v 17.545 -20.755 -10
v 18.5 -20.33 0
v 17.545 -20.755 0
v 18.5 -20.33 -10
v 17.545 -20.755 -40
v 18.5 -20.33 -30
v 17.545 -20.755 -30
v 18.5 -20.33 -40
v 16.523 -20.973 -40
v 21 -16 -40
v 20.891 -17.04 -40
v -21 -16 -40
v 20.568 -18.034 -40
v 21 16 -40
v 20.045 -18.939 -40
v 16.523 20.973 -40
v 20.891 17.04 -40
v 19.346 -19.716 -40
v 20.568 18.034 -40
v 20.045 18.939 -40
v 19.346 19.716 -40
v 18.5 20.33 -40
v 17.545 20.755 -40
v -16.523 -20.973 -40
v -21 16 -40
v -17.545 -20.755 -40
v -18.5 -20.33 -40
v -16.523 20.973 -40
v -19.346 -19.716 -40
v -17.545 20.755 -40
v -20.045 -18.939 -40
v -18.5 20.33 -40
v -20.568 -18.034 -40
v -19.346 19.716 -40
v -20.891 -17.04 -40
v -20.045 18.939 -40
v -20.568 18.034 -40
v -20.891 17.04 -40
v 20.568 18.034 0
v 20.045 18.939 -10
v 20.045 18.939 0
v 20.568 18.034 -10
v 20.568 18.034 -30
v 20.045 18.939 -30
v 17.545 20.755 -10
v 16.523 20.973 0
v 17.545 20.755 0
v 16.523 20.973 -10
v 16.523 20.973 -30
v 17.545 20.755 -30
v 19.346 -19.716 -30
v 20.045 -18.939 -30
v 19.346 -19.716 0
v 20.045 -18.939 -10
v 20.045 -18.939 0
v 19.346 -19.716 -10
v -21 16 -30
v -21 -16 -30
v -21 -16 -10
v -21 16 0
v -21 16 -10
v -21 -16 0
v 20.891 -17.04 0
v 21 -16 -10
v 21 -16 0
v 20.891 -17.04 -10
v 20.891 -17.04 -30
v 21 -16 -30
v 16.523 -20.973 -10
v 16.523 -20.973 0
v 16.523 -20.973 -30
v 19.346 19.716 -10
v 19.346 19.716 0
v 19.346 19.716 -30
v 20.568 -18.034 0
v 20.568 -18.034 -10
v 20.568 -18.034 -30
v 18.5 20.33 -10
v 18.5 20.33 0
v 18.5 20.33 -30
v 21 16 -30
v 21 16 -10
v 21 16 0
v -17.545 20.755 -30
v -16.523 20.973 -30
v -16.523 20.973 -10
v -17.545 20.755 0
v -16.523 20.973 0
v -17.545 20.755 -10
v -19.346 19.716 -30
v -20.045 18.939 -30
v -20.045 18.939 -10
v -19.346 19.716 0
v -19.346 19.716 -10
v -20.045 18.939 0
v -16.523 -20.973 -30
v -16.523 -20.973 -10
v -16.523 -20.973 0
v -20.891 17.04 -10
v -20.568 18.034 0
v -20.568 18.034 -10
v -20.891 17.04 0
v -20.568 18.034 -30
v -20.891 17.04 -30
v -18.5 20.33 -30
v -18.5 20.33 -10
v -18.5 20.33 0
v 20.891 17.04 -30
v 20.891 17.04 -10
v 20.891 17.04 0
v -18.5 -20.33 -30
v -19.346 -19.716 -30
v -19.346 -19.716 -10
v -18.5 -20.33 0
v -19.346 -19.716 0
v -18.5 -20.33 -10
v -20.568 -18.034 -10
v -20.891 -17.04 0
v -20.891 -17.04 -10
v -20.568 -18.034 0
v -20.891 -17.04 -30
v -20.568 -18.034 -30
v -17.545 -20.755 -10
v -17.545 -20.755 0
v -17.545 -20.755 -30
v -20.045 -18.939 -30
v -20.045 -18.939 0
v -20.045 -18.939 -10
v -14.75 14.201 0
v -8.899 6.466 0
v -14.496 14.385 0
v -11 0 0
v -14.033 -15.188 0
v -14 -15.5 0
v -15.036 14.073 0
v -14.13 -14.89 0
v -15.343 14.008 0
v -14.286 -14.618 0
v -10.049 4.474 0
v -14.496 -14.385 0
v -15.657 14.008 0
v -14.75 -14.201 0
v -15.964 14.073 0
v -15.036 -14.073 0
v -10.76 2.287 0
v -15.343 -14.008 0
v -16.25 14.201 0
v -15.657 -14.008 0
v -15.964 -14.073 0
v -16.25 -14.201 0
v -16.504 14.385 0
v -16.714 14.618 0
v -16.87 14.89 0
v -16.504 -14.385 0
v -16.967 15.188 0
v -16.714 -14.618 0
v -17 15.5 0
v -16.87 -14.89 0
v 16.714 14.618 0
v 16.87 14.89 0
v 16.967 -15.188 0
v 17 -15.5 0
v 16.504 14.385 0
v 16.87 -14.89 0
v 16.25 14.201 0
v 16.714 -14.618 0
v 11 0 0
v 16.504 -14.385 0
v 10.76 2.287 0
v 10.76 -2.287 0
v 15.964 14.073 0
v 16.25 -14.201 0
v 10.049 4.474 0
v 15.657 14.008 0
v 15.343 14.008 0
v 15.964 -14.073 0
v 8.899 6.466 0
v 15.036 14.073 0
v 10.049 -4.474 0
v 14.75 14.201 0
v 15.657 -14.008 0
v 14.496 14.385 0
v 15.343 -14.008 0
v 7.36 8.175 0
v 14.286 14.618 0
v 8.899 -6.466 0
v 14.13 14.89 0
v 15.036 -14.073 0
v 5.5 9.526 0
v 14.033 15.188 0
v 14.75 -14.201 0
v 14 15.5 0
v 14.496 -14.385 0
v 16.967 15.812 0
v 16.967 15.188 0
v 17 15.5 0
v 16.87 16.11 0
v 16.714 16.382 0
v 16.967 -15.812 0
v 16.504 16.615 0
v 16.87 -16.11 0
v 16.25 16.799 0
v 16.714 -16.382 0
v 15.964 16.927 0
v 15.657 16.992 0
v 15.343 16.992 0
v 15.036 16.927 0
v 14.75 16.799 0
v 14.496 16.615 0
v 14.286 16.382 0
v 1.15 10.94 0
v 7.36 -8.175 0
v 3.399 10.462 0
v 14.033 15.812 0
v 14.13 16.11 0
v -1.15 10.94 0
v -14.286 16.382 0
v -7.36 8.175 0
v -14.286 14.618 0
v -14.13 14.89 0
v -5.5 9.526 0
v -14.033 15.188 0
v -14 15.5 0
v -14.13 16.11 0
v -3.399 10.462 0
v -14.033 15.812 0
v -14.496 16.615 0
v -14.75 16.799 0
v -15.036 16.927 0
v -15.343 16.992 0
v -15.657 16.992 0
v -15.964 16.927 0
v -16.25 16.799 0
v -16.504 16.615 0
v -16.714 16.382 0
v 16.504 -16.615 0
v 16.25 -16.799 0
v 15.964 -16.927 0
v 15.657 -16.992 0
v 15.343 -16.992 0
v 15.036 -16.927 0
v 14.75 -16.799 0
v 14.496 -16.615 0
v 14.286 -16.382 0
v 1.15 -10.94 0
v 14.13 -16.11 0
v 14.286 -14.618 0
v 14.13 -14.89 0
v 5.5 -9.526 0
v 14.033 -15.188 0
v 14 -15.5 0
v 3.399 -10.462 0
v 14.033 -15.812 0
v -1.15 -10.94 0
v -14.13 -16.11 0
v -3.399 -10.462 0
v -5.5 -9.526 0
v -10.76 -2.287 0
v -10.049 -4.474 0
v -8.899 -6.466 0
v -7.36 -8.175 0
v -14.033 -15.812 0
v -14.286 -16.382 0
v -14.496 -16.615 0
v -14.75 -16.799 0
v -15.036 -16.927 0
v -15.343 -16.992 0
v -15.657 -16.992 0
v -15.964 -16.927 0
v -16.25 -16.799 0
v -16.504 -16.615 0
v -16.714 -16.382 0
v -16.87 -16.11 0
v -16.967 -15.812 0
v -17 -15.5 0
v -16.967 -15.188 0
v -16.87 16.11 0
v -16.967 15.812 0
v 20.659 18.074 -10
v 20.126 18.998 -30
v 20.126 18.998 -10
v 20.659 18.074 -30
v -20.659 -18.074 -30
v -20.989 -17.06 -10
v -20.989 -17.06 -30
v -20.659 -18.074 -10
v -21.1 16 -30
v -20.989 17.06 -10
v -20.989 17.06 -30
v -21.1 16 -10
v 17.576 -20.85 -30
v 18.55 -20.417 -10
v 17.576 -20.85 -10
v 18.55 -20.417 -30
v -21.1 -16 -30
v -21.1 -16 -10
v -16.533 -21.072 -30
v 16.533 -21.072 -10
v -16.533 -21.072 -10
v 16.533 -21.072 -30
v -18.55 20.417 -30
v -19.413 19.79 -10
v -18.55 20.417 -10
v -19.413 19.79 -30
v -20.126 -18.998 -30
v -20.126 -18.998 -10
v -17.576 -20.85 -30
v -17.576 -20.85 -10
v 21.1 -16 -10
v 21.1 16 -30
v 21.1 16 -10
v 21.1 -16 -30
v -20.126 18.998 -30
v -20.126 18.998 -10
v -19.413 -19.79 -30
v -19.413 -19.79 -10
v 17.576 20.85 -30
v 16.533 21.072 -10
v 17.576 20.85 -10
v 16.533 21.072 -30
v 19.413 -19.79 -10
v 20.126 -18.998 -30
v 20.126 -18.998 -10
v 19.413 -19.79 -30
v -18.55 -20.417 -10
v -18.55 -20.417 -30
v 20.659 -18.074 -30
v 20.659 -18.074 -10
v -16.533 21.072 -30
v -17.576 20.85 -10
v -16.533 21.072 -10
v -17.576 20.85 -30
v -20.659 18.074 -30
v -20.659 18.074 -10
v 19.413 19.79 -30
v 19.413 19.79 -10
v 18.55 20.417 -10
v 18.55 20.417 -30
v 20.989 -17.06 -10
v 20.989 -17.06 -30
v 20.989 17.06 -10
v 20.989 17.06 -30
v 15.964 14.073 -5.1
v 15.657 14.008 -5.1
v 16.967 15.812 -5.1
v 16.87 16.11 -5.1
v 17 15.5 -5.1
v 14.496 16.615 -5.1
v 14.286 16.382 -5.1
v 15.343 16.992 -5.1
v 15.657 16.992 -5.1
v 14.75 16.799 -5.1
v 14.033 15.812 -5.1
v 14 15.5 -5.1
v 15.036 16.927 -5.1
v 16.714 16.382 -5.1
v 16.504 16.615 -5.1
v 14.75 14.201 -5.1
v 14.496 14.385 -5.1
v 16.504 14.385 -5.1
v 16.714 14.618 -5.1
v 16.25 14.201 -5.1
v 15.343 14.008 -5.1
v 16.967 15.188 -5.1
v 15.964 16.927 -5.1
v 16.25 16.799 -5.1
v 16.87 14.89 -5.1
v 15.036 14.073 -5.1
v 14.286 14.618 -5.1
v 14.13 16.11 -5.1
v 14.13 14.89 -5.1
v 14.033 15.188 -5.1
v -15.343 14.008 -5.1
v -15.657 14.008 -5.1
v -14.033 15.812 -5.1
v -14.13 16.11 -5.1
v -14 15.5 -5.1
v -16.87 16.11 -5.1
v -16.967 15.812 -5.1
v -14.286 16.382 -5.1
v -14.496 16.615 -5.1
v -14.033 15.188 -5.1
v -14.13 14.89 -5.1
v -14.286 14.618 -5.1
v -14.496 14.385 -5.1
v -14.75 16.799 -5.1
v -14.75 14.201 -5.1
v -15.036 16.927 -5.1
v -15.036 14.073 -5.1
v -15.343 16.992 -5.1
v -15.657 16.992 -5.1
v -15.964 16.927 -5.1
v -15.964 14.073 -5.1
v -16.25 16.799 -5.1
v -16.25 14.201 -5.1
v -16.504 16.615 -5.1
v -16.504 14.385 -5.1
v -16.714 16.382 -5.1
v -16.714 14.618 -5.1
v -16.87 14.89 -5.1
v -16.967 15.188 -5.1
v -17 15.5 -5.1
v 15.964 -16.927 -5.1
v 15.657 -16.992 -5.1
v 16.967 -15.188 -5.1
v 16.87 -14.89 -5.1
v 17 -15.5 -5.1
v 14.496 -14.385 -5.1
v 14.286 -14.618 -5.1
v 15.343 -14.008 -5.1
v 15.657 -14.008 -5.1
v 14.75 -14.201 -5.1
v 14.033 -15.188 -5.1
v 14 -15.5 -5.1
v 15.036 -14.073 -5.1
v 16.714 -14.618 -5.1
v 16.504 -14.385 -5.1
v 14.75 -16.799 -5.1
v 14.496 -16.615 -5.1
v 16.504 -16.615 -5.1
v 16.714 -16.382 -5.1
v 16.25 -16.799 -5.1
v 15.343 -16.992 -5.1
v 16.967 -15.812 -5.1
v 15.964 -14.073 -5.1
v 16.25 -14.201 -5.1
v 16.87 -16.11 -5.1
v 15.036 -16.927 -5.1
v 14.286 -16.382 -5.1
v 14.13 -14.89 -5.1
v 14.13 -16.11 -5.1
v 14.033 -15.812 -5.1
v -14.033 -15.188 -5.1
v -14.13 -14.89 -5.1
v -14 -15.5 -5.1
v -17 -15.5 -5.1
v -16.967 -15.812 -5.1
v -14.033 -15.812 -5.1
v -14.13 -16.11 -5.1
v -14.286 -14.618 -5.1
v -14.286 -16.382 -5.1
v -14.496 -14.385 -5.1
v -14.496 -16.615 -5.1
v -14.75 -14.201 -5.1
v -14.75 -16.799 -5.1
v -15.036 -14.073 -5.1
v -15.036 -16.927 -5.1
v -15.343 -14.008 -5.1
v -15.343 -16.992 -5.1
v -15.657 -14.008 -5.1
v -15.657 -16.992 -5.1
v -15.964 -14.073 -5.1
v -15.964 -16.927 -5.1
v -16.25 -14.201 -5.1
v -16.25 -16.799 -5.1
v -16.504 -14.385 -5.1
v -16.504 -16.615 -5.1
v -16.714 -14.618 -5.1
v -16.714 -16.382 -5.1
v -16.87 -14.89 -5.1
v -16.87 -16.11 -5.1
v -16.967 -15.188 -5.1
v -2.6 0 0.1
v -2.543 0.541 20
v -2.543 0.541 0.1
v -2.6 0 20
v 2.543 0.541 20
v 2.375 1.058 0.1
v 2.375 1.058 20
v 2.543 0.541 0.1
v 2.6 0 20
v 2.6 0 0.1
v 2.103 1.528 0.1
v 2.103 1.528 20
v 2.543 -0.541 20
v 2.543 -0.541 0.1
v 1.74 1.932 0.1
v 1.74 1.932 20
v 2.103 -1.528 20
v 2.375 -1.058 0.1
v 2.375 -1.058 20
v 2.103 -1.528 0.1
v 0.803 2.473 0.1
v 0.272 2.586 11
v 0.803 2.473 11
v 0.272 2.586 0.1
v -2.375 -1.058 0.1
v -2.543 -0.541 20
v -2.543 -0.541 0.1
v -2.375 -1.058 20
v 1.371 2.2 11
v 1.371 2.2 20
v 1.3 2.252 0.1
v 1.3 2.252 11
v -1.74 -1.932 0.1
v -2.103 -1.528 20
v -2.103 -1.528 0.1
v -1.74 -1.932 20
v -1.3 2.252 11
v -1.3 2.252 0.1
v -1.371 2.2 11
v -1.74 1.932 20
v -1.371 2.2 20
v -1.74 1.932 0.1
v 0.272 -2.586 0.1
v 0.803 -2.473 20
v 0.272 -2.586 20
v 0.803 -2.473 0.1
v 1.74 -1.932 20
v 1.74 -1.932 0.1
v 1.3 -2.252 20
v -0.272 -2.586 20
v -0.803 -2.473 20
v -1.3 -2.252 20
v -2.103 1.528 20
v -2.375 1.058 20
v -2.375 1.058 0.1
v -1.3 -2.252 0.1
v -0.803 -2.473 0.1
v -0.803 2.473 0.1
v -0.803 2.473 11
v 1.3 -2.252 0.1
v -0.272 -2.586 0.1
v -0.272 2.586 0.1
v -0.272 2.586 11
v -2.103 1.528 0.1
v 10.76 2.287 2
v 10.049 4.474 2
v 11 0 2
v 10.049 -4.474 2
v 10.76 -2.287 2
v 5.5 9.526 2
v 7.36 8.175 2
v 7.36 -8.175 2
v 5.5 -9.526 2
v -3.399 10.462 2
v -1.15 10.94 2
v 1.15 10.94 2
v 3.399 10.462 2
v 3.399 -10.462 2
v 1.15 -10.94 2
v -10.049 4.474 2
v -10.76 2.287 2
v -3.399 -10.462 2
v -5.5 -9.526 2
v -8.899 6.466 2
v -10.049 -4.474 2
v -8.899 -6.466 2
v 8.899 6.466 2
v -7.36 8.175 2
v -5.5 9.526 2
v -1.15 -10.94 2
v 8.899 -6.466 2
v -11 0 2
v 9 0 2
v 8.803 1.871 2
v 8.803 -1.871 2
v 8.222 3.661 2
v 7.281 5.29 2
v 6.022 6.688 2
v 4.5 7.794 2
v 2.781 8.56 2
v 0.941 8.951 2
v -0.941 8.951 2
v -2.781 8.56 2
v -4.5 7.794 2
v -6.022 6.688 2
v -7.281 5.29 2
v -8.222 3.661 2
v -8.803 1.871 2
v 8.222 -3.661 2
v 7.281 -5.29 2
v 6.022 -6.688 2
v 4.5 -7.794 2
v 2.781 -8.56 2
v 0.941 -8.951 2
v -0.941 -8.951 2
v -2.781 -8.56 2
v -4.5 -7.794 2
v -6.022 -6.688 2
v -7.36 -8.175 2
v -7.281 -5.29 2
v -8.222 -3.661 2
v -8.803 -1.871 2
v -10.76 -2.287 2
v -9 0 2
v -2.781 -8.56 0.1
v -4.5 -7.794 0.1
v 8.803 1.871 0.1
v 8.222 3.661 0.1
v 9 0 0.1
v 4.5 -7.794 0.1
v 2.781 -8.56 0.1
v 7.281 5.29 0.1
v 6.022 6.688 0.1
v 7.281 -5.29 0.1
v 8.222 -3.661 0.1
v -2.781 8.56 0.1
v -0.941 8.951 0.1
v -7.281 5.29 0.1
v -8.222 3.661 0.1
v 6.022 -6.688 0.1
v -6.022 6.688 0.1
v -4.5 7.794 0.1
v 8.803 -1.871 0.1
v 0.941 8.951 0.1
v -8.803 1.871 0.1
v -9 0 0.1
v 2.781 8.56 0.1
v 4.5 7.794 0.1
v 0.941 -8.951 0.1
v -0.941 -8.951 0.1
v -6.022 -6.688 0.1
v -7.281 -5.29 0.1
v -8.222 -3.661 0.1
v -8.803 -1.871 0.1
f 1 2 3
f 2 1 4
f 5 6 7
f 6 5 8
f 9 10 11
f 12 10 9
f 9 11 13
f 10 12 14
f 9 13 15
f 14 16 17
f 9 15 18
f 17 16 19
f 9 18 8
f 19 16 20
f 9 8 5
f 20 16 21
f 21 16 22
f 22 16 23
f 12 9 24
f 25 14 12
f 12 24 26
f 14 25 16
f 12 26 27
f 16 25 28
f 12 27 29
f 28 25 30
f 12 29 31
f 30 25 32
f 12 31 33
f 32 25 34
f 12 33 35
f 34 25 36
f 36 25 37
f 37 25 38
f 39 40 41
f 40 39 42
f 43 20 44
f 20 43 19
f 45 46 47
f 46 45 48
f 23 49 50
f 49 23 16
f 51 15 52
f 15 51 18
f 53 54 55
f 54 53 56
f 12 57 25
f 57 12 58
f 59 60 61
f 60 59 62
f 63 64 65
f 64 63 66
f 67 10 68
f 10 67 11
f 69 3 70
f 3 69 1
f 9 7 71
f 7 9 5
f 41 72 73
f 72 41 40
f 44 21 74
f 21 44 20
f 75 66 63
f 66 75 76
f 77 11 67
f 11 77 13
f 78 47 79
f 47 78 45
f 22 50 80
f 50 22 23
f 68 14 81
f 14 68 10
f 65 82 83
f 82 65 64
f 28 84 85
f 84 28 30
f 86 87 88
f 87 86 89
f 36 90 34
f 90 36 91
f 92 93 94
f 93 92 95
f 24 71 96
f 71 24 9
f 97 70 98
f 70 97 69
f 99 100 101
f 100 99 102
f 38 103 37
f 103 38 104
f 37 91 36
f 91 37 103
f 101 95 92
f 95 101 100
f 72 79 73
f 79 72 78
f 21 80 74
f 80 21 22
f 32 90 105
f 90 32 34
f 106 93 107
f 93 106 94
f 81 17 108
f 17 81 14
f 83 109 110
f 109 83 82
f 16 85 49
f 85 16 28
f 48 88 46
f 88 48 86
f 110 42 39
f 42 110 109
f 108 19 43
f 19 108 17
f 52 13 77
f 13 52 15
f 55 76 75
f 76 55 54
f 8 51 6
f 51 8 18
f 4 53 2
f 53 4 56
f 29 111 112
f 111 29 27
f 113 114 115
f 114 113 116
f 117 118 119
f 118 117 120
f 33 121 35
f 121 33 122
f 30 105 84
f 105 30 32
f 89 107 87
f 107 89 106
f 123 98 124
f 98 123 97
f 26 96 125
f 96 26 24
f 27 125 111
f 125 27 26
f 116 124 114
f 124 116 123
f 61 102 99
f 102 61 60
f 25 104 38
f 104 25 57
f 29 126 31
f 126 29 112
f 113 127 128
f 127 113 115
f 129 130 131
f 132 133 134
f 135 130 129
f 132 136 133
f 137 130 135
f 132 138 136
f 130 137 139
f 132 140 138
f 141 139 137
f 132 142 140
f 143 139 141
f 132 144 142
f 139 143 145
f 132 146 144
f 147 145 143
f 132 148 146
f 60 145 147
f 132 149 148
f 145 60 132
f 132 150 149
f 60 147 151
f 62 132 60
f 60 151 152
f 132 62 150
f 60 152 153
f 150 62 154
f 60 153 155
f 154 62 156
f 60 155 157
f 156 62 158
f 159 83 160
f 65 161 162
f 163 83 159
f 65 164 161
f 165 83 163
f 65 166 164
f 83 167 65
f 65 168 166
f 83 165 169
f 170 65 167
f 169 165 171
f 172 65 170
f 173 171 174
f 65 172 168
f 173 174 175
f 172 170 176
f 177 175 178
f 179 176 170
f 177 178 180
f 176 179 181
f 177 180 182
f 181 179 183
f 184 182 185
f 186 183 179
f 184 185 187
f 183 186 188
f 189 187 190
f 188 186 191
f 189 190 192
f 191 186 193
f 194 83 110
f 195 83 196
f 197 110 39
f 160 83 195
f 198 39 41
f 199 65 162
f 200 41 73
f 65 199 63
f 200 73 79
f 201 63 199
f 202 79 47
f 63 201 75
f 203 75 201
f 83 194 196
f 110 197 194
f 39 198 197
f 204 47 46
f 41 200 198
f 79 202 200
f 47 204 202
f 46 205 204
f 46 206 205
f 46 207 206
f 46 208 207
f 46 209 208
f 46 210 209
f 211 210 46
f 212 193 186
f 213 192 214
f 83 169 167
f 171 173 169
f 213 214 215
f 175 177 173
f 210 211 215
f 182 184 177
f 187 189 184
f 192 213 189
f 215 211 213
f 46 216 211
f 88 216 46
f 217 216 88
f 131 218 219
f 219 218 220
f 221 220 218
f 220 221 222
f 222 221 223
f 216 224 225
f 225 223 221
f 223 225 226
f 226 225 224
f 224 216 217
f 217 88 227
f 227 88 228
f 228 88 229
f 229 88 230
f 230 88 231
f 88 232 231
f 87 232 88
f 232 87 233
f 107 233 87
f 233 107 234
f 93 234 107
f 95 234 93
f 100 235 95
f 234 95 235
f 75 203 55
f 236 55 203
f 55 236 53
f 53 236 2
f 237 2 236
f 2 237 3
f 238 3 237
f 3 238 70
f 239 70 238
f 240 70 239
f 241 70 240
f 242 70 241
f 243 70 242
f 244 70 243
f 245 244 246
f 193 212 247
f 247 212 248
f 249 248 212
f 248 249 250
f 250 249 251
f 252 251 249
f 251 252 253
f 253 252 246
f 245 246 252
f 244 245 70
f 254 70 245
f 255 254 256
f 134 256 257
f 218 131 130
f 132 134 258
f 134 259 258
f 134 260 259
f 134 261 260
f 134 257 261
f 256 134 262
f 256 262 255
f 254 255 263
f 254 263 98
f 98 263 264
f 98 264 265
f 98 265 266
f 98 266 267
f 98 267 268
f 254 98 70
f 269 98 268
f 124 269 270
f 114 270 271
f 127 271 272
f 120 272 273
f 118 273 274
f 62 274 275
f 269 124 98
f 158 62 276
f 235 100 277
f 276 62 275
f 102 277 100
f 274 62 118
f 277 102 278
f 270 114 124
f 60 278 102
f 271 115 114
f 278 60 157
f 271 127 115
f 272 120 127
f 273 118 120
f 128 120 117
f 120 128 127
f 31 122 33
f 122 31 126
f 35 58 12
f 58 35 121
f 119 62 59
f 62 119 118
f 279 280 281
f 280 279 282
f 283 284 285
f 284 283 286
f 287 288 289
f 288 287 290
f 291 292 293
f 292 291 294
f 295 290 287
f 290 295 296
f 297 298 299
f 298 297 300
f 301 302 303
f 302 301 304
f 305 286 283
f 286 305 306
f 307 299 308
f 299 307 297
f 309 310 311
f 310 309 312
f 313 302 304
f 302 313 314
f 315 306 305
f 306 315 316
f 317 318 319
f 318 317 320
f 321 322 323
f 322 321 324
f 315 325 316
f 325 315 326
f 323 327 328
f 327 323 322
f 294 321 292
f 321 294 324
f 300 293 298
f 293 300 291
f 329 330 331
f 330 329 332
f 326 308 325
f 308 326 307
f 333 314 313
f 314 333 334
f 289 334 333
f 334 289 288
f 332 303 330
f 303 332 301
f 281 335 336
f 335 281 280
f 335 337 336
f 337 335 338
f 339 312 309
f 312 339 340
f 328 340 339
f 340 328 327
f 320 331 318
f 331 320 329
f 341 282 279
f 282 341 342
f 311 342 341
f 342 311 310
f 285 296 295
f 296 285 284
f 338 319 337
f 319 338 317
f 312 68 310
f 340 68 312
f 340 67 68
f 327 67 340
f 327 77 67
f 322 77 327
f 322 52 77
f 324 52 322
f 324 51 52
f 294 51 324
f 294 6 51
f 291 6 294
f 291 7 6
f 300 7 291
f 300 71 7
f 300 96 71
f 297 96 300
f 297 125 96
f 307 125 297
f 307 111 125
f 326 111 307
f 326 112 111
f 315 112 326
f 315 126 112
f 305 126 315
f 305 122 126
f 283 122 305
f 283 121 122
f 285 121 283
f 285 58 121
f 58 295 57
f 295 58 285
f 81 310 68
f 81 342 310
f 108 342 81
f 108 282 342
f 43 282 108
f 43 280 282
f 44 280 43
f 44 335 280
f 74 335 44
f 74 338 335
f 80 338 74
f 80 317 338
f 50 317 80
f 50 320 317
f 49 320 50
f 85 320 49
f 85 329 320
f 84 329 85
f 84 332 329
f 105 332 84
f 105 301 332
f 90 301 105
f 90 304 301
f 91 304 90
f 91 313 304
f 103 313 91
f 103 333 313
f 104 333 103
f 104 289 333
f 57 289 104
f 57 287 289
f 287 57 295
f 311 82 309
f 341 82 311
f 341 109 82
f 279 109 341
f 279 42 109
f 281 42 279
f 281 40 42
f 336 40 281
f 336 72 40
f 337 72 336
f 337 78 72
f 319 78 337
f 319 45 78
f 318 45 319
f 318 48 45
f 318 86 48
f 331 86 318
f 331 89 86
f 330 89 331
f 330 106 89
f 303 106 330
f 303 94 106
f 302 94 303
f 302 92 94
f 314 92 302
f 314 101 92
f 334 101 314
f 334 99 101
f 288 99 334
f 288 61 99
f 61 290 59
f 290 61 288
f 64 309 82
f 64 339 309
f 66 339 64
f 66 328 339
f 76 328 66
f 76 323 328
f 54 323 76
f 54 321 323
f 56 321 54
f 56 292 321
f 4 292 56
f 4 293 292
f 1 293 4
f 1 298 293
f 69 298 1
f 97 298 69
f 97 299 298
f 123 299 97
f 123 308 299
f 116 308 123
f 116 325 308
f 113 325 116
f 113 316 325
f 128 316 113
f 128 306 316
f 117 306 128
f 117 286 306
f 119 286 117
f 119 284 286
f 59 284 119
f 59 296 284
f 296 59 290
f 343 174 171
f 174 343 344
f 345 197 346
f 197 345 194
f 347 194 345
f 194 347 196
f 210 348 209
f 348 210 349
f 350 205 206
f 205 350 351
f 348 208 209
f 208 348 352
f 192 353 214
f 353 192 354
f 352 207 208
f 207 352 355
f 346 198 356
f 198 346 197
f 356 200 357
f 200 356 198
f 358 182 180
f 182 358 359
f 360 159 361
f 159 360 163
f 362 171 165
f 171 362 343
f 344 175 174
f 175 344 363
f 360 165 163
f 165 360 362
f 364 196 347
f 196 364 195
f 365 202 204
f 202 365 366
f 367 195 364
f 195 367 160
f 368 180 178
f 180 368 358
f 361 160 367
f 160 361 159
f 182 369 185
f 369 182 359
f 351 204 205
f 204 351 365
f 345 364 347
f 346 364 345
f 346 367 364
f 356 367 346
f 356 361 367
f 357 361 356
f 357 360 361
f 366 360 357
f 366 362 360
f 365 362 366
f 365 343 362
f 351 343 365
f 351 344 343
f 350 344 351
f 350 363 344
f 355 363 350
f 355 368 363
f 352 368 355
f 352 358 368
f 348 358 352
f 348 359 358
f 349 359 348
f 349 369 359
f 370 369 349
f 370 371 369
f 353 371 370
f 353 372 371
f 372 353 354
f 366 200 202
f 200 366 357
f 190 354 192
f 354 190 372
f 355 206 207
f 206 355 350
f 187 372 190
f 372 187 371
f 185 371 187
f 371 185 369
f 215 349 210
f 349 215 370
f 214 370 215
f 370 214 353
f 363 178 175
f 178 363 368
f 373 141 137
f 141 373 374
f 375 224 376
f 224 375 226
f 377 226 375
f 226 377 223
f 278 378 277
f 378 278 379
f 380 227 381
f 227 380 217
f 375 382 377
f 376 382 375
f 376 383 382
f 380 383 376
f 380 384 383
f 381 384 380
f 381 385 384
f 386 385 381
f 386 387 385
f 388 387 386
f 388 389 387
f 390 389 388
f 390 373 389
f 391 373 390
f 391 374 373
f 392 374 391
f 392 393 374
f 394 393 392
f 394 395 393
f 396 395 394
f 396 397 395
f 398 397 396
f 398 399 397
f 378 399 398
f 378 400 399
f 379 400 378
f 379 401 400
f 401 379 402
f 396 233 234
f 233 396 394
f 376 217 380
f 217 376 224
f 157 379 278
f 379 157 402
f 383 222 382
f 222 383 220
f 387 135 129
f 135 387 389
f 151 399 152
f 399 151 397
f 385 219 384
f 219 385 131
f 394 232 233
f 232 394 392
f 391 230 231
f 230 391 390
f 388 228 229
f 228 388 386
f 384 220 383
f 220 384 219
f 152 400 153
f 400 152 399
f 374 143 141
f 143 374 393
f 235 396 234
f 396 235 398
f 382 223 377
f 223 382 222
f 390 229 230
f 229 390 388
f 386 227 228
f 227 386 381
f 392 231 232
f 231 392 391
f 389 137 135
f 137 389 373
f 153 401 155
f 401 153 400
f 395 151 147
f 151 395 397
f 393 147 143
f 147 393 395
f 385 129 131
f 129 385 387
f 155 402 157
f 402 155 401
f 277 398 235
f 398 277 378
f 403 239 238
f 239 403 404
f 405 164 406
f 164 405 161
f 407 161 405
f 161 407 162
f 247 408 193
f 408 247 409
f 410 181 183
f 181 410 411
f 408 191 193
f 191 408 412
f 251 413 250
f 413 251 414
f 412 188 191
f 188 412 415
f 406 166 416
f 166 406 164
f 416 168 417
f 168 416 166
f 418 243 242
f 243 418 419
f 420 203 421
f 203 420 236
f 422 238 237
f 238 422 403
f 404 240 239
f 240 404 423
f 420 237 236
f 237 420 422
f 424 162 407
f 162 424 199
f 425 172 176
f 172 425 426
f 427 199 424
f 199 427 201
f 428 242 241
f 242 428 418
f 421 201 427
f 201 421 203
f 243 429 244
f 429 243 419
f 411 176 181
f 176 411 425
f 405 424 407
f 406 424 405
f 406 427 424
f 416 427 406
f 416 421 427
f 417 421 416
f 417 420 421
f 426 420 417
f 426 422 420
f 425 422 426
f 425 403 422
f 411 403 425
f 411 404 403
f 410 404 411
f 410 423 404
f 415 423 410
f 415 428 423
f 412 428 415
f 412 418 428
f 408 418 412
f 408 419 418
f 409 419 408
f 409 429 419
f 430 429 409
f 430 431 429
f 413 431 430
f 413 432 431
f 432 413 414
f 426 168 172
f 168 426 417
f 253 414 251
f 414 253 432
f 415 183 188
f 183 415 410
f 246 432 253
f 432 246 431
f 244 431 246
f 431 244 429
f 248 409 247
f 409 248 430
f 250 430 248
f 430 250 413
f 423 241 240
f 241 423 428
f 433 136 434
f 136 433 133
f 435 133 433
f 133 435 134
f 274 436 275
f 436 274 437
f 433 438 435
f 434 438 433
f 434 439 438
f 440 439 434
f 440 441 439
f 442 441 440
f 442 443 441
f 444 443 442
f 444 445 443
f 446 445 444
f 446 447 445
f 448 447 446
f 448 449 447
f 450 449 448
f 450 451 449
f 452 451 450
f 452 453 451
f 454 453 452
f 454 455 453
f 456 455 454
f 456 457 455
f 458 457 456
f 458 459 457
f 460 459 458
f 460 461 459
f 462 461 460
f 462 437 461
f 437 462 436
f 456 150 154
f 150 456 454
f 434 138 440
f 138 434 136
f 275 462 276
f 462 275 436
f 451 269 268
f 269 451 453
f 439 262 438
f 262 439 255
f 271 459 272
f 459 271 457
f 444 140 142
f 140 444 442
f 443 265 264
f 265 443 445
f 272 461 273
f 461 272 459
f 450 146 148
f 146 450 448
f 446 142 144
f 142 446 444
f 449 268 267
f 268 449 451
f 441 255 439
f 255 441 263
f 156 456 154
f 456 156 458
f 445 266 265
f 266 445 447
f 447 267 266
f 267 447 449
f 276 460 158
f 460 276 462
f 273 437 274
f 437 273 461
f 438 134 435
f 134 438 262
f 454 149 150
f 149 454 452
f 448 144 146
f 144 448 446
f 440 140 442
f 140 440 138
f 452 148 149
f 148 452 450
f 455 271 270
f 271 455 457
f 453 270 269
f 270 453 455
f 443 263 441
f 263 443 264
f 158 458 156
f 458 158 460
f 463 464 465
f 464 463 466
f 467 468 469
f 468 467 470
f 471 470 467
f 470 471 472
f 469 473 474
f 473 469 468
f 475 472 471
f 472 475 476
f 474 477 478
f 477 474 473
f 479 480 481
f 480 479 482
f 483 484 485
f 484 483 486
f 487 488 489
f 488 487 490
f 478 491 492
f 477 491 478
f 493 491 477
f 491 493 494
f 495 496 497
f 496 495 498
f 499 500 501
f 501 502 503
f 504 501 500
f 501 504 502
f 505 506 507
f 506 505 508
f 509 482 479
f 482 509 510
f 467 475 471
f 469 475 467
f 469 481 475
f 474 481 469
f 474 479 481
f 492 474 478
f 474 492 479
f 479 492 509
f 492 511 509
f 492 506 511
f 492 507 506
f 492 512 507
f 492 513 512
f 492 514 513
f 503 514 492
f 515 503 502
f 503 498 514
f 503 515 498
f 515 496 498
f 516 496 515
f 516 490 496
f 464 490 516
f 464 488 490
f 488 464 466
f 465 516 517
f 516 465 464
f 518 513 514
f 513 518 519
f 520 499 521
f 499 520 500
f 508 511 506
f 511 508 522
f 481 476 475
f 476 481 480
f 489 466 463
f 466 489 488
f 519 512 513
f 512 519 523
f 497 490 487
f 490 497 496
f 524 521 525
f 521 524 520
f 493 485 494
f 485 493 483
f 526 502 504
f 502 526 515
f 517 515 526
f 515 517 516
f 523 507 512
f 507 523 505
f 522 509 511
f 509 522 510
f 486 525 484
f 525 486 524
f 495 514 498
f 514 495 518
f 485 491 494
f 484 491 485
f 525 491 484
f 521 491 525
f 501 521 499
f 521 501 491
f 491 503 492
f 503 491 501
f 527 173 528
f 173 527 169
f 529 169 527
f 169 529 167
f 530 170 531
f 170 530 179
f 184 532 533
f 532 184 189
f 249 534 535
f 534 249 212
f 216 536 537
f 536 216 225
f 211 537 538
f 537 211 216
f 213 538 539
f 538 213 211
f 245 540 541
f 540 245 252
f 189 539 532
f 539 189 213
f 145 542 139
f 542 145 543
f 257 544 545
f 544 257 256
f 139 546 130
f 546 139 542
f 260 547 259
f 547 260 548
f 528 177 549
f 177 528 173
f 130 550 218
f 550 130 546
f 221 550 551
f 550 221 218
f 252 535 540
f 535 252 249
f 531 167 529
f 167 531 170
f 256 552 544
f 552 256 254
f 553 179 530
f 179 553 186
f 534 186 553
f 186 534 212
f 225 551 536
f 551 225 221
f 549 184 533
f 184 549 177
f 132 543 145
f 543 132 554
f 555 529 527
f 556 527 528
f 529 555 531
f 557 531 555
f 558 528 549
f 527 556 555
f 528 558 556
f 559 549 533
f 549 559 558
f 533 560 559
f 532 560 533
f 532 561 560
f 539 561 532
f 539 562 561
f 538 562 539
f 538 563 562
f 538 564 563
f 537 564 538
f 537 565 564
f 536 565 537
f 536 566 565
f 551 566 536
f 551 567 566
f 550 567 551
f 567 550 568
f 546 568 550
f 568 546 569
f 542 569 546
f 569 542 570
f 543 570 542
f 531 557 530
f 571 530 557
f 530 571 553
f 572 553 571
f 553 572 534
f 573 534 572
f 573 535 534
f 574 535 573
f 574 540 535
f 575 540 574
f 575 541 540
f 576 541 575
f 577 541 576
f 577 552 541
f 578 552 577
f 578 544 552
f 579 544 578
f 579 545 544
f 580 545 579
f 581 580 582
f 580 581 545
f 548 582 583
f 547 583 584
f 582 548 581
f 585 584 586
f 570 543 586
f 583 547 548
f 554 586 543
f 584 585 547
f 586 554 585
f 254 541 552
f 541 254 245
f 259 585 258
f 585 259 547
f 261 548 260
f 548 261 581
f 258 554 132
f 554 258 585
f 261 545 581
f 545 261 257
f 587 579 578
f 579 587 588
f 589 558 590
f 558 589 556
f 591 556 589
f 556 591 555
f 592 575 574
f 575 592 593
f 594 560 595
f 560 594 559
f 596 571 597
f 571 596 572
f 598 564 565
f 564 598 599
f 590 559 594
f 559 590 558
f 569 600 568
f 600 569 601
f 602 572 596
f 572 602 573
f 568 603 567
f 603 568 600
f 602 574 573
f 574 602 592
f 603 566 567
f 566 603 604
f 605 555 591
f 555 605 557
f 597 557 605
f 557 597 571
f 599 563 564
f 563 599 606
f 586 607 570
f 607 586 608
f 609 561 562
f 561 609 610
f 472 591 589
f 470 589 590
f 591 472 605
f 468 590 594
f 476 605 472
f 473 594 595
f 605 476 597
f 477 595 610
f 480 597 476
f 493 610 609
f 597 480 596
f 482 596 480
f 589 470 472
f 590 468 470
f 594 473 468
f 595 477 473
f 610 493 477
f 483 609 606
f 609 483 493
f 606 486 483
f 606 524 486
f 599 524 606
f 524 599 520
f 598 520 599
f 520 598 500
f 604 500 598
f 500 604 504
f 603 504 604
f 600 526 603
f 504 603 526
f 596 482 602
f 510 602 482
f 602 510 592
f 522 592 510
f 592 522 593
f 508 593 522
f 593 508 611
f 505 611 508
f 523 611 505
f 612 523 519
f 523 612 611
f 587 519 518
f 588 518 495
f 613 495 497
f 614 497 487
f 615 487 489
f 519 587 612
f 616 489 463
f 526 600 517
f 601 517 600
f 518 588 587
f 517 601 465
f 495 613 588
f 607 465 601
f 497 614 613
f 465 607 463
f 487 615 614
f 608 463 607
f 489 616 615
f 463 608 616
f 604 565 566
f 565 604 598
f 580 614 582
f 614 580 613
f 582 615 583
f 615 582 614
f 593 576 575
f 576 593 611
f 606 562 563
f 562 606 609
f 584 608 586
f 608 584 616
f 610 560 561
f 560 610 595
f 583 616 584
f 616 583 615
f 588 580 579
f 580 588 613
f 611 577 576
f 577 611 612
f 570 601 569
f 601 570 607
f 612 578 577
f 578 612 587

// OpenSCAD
$fn=30;
module nema17(altezzam = 40, diametro = 5.2, asta = 0.2)
{
rotate(a=90, v=[-1,0,0])
nema(grandezzam = 42, altezzam = 40, diametro = 5.2, asta = 0.2);
}

nema17();

module nema(grandezzam=42, altezzam = 38, diametro = 5.2, asta = 0.2) {
	difference() {
    union()
    {
      color("silver")
		translate([0,altezzam/2,0]) rotate([90,0,0]) hull() {
			translate([-(grandezzam/2-5),(grandezzam/2-5),0]) cylinder(r=5,h=altezzam, center = true);
			translate([(grandezzam/2-5),(grandezzam/2-5),0]) cylinder(r=5,h=altezzam, center = true);
			translate([-(grandezzam/2-5),-(grandezzam/2-5),0]) cylinder(r=5,h=altezzam, center = true);
			translate([(grandezzam/2-5),-(grandezzam/2-5),0]) cylinder(r=5,h=altezzam, center = true);
		}
        color("black")
        translate([0,altezzam/2,0]) rotate([90,0,0]) hull() {
            translate([-(grandezzam/2-5),(grandezzam/2-5),0]) cylinder(r=5.1,h=altezzam/2, center = true);
            translate([(grandezzam/2-5),(grandezzam/2-5),0]) cylinder(r=5.1,h=altezzam/2, center = true);
            translate([-(grandezzam/2-5),-(grandezzam/2-5),0]) cylinder(r=5.1,h=altezzam/2, center = true);
            translate([(grandezzam/2-5),-(grandezzam/2-5),0]) cylinder(r=5.1,h=altezzam/2, center = true);
        }
    }


        union() {
		translate([15.5,0.1,15.5]) rotate([90,0,0]) cylinder(r=1.5,h=10, center = true);
		translate([-15.5,0.1,15.5]) rotate([90,0,0]) cylinder(r=1.5,h=10, center = true);
		translate([15.5,0.1,-15.5]) rotate([90,0,0]) cylinder(r=1.5,h=10, center = true);
		translate([-15.5,0.1,-15.5]) rotate([90,0,0]) cylinder(r=1.5,h=10, center = true);
        }
	}
    color("silver")
	translate([0,-10,0]) rotate([90,0,0])
    difference() {
        cylinder(r=diametro/2,h=20, center = true);
        translate([-diametro/2,(diametro/2)-asta*2,1])
        cube([diametro,diametro/2,10]);
    }
    color("silver")
	difference() {
		translate([0,-1,0]) rotate([90,0,0]) cylinder(r=11,h=2, center = true);
		translate([0,-1.1,0]) rotate([90,0,0]) cylinder(r=9,h=2, center = true);
	}
}

module buchi(pos=[1,1,1,1], grand=15.5, h=10, buchi=false, $fn=8){
    for (i=[0:3]) {
        if (pos[i] == 1) {
            rotate([0, 0, 90*i]) translate([grand, grand, 0]) {
                if (buchi) {
                    rotate([0, 0, -90*i]) translate([0,0,0]) rotate([0,0,90]) cylinder(h = h+0.1, r = 3/2);
					rotate([0, 0, -90*i]) translate([0,0,h]) rotate([0,0,22.5]) cylinder(h = h, r = 3*2.2/2, $fn = $fn);
                } else {
                    rotate([0, 0, -90*i]) cylinder(h=h, r=4, $fn=$fn);
                }
            }
        }
    }
}
